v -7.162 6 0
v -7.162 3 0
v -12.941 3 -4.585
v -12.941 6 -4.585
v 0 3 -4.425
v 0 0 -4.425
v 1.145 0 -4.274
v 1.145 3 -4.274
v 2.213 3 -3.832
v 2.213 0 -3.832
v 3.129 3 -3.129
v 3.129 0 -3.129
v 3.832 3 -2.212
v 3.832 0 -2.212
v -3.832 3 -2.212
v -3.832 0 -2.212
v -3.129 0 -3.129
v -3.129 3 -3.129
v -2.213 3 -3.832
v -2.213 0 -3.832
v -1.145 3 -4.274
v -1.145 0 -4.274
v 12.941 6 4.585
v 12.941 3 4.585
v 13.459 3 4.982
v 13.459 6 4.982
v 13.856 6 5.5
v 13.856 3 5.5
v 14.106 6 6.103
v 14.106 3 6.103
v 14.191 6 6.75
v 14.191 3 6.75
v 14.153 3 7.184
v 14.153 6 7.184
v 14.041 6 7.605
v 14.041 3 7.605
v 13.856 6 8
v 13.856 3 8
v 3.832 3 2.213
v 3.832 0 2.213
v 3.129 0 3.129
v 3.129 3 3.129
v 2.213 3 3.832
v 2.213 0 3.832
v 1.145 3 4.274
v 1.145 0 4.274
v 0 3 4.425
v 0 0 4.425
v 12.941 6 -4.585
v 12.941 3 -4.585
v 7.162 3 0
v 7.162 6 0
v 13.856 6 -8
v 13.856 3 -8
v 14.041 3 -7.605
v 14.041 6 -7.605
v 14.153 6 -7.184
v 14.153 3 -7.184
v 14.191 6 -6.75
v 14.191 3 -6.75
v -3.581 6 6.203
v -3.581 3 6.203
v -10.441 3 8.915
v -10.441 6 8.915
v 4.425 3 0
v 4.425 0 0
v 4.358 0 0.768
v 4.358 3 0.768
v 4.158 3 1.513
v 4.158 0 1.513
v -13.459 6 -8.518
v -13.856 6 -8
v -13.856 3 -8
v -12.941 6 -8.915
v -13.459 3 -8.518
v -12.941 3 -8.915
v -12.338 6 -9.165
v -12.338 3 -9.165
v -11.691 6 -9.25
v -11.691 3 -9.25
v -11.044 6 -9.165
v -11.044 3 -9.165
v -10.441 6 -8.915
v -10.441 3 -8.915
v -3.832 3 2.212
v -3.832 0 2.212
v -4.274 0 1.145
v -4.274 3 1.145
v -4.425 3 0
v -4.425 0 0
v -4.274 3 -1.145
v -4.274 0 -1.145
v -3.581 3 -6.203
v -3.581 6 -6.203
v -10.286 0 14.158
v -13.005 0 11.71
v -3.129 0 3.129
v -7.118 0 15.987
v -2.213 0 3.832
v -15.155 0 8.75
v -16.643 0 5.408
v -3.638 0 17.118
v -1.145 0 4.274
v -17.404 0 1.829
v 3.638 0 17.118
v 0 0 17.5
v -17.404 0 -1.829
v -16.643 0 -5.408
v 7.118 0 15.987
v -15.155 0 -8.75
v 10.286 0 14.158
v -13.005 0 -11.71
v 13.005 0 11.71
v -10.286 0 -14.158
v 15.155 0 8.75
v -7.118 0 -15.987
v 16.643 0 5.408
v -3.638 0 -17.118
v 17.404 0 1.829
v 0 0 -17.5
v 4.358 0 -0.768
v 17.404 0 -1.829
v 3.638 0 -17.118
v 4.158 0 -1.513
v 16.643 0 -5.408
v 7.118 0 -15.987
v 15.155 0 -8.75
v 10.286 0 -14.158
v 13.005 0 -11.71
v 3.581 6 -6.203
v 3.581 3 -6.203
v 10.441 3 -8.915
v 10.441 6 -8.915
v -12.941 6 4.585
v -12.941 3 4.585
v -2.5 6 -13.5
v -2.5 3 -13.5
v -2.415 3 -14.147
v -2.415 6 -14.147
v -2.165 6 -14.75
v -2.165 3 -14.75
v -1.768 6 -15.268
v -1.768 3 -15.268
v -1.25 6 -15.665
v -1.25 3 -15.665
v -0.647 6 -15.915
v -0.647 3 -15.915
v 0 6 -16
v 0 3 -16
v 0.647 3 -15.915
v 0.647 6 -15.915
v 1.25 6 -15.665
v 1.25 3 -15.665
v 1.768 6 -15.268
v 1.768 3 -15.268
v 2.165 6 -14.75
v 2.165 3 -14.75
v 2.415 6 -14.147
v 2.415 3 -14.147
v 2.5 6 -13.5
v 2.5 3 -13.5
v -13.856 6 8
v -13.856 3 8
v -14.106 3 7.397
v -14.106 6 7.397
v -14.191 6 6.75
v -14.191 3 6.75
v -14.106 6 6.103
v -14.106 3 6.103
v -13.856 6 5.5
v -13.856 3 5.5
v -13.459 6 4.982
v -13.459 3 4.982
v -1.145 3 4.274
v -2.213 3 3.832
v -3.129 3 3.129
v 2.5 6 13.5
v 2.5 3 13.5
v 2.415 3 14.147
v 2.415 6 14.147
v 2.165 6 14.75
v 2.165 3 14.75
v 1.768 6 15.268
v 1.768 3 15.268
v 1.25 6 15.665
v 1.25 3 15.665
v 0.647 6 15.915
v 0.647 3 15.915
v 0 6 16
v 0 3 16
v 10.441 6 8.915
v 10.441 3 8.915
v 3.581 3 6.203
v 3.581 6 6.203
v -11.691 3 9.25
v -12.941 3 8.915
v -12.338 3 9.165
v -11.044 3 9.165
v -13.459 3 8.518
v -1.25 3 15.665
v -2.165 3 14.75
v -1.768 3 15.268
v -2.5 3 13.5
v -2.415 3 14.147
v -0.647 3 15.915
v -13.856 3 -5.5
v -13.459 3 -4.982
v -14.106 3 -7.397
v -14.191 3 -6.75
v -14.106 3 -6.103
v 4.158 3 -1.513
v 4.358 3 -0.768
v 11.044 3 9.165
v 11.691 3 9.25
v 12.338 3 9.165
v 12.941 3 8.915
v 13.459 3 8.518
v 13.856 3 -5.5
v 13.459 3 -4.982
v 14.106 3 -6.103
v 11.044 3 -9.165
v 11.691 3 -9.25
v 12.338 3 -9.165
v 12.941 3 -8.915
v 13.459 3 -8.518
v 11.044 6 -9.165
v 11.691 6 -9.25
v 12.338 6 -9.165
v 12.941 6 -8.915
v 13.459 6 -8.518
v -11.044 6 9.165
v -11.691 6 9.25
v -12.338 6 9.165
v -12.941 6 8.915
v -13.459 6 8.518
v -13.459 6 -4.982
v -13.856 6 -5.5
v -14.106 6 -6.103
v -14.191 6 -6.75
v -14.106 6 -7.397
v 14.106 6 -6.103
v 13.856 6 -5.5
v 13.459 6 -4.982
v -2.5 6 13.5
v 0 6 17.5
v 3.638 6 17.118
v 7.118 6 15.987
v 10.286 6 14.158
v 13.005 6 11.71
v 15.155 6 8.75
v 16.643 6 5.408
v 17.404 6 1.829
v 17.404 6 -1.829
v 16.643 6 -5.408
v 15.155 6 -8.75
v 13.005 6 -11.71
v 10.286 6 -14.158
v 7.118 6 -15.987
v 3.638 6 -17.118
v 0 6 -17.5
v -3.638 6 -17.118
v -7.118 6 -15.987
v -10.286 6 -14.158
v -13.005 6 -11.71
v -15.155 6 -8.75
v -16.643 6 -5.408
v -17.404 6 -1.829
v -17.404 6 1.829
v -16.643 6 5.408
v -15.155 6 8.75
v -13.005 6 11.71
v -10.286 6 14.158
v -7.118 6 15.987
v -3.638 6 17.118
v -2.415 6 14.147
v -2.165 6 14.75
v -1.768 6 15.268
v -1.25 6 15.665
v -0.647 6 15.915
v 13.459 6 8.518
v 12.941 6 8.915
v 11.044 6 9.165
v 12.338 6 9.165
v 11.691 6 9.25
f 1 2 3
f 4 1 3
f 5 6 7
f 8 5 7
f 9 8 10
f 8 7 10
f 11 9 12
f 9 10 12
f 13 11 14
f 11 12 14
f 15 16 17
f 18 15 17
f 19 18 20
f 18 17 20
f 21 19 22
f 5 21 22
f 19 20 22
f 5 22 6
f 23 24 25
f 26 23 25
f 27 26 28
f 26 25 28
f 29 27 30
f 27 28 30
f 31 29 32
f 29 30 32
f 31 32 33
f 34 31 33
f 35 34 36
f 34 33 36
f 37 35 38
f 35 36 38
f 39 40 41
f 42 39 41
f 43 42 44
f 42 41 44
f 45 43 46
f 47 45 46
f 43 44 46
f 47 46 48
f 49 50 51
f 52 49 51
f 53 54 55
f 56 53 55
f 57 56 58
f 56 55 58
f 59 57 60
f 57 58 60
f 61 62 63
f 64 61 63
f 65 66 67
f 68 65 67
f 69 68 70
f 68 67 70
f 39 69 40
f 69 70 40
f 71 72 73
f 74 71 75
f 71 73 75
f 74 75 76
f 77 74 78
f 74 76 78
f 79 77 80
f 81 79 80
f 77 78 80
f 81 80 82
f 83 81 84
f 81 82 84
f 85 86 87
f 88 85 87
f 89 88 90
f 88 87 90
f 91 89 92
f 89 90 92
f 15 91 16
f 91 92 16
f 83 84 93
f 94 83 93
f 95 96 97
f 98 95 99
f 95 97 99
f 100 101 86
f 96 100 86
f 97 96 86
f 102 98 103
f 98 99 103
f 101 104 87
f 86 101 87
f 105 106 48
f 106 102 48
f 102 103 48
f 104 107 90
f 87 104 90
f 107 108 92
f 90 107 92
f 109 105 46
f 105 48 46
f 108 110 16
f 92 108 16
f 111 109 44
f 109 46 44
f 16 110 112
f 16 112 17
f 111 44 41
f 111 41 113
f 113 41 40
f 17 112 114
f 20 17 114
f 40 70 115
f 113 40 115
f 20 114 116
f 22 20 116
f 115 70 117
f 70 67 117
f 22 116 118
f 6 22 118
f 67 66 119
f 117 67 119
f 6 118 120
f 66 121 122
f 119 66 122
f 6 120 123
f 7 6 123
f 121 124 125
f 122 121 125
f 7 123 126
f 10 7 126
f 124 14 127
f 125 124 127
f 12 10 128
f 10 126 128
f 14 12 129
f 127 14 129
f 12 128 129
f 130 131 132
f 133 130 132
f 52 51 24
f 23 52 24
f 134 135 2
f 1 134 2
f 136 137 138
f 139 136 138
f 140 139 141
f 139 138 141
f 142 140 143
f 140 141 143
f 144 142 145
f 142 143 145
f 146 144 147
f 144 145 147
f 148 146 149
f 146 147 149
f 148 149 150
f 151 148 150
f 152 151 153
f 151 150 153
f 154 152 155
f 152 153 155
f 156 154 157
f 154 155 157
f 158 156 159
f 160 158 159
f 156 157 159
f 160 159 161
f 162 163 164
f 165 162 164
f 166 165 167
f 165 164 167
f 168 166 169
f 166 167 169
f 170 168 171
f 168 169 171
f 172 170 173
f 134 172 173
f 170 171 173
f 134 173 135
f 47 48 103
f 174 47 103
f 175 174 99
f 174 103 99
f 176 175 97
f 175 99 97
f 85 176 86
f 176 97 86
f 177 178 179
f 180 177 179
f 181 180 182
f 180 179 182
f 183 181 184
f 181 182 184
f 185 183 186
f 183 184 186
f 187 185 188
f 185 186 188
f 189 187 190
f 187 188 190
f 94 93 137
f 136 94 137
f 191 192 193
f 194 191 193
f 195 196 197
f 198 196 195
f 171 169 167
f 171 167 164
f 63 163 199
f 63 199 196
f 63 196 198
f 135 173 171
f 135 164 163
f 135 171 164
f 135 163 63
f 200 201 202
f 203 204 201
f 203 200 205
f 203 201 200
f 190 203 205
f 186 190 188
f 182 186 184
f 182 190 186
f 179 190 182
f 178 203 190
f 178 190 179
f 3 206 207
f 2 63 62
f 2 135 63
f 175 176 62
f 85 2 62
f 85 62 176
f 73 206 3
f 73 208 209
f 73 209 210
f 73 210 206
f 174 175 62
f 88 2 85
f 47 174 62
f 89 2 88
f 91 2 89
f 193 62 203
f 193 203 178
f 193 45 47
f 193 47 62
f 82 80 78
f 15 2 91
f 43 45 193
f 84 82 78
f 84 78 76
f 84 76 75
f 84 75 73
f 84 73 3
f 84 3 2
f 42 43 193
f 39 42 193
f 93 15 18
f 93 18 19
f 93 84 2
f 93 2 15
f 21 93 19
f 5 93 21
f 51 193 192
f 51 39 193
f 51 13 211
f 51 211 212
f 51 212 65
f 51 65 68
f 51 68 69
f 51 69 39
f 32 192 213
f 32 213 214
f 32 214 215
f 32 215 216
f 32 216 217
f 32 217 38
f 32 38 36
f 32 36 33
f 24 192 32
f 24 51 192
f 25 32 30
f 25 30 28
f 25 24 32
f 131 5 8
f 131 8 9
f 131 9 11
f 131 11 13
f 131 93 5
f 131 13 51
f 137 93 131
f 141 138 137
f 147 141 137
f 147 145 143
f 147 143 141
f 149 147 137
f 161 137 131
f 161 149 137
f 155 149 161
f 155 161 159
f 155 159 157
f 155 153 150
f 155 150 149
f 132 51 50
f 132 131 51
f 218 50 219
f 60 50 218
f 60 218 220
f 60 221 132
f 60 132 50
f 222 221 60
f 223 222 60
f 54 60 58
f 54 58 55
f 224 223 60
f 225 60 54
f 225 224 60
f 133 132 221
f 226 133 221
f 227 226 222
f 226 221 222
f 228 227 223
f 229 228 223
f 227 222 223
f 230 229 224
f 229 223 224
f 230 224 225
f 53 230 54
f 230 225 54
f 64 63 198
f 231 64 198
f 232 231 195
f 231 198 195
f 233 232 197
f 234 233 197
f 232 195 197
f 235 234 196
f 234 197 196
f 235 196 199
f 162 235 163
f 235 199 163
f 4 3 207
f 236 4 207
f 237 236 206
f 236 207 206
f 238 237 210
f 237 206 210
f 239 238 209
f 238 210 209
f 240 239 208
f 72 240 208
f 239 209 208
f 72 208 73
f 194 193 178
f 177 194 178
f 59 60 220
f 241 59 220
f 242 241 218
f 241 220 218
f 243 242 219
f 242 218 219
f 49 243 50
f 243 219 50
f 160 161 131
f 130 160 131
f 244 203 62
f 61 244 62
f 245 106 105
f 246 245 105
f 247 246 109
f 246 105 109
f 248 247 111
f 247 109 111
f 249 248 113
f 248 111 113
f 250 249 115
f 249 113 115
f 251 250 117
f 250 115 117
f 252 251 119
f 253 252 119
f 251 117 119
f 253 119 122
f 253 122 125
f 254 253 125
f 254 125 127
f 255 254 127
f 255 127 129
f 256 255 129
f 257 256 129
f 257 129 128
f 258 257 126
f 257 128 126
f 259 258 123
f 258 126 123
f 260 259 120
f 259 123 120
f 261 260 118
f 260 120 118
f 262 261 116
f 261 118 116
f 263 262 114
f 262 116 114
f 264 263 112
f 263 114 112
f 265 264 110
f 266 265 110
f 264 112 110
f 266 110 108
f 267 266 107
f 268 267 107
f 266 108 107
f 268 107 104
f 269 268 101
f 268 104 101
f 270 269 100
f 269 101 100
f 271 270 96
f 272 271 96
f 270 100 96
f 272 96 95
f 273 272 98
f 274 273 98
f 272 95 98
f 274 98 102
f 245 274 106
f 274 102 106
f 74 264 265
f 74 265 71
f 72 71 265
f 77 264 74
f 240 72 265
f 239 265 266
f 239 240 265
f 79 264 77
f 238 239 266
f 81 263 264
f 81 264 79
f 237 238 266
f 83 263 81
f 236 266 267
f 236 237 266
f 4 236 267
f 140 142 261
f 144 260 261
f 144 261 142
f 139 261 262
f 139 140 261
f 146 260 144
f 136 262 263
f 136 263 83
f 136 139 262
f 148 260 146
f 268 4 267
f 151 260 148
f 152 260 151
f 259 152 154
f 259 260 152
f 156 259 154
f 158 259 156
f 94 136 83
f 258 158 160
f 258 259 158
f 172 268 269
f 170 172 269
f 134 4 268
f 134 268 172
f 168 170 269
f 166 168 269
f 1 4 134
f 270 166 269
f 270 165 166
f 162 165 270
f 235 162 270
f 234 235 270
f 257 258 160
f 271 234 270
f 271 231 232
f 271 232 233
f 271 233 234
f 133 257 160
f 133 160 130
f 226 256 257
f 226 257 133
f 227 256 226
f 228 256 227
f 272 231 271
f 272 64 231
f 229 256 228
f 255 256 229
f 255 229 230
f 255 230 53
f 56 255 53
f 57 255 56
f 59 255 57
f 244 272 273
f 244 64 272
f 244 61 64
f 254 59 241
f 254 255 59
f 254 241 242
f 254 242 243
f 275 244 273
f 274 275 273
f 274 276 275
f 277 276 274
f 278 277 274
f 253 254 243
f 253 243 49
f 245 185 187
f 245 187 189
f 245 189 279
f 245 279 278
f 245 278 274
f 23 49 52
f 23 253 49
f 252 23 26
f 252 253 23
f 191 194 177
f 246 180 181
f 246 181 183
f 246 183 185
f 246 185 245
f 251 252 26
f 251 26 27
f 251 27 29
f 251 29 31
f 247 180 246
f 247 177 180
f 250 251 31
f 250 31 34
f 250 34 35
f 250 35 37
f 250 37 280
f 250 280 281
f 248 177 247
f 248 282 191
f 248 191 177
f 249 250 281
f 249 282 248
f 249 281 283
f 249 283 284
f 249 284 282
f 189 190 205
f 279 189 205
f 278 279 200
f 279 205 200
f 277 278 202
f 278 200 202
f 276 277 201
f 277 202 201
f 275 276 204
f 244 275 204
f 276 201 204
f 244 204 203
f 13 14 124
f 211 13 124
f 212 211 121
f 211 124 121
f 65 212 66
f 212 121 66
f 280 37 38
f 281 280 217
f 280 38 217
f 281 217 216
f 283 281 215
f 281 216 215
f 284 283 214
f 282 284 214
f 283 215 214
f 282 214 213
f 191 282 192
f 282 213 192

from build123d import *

# Parameters (mm, degrees)
SKETCH1_R           = 17.5
BOSS_EXTRUDE3_DEPTH = 6
SKETCH1_11_R        = 4.425
BOSS_EXTRUDE5_DEPTH = 3


with BuildPart() as part:
    # Sketch1 → Boss-Extrude3 (new body)
    with BuildSketch(Plane(origin=(0, 0, 0), x_dir=(1, 0, 0), z_dir=(0, 1, 0))):
        Circle(SKETCH1_R)
        with BuildLine():
            ThreePointArc((-2.5, 13.5), (-1.767766953, 15.267766953), (0, 16))
            ThreePointArc((0, 16), (1.767766953, 15.267766953), (2.5, 13.5))
            Line((2.5, 13.5), (3.581091494, 6.202632414))
            Line((3.581091494, 6.202632414), (10.441342951, 8.915063509))
            ThreePointArc((10.441342951, 8.915063509), (12.338390564, 9.164814566), (13.856406461, 8))
            ThreePointArc((13.856406461, 8), (14.106157517, 7.397047613), (14.191342951, 6.75))
            ThreePointArc((14.191342951, 6.75), (13.856406461, 5.5), (12.941342951, 4.584936491))
            Line((12.941342951, 4.584936491), (7.162182988, 0))
            Line((7.162182988, 0), (12.941342951, -4.584936491))
            ThreePointArc((12.941342951, -4.584936491), (13.856406461, -5.5), (14.191342951, -6.75))
            ThreePointArc((14.191342951, -6.75), (14.106157517, -7.397047613), (13.856406461, -8))
            ThreePointArc((13.856406461, -8), (12.338390564, -9.164814566), (10.441342951, -8.915063509))
            Line((10.441342951, -8.915063509), (3.581091494, -6.202632414))
            Line((3.581091494, -6.202632414), (2.5, -13.5))
            ThreePointArc((2.5, -13.5), (1.767766953, -15.267766953), (0, -16))
            ThreePointArc((0, -16), (-1.767766953, -15.267766953), (-2.5, -13.5))
            Line((-2.5, -13.5), (-3.581091494, -6.202632414))
            Line((-3.581091494, -6.202632414), (-10.441342951, -8.915063509))
            ThreePointArc((-10.441342951, -8.915063509), (-12.338390564, -9.164814566), (-13.856406461, -8))
            ThreePointArc((-13.856406461, -8), (-14.106157517, -6.102952387), (-12.941342951, -4.584936491))
            Line((-12.941342951, -4.584936491), (-7.162182988, 0))
            Line((-7.162182988, 0), (-12.941342951, 4.584936491))
            ThreePointArc((-12.941342951, 4.584936491), (-14.106157517, 6.102952387), (-13.856406461, 8))
            ThreePointArc((-13.856406461, 8), (-12.338390564, 9.164814566), (-10.441342951, 8.915063509))
            Line((-10.441342951, 8.915063509), (-3.581091494, 6.202632414))
            Line((-3.581091494, 6.202632414), (-2.5, 13.5))
        make_face(mode=Mode.SUBTRACT)
    extrude(amount=BOSS_EXTRUDE3_DEPTH)

    # Sketch1<11> → Boss-Extrude5 (add)
    with BuildSketch(Plane(origin=(0, 0, 0), x_dir=(1, 0, 0), z_dir=(0, 1, 0))):
        with BuildLine():
            Line((-2.5, 13.5), (-3.581091494, 6.202632414))
            Line((-3.581091494, 6.202632414), (-10.441342951, 8.915063509))
            ThreePointArc((-10.441342951, 8.915063509), (-13.856406461, 8), (-12.941342951, 4.584936491))
            Line((-12.941342951, 4.584936491), (-7.162182988, 0))
            Line((-7.162182988, 0), (-12.941342951, -4.584936491))
            ThreePointArc((-12.941342951, -4.584936491), (-13.856406461, -8), (-10.441342951, -8.915063509))
            Line((-10.441342951, -8.915063509), (-3.581091494, -6.202632414))
            Line((-3.581091494, -6.202632414), (-2.5, -13.5))
            ThreePointArc((-2.5, -13.5), (0, -16), (2.5, -13.5))
            Line((2.5, -13.5), (3.581091494, -6.202632414))
            Line((3.581091494, -6.202632414), (10.441342951, -8.915063509))
            ThreePointArc((10.441342951, -8.915063509), (13.856406461, -8), (12.941342951, -4.584936491))
            Line((12.941342951, -4.584936491), (7.162182988, 0))
            Line((7.162182988, 0), (12.941342951, 4.584936491))
            ThreePointArc((12.941342951, 4.584936491), (13.856406461, 8), (10.441342951, 8.915063509))
            Line((10.441342951, 8.915063509), (3.581091494, 6.202632414))
            Line((3.581091494, 6.202632414), (2.5, 13.5))
            ThreePointArc((2.5, 13.5), (0, 16), (-2.5, 13.5))
        make_face()
        Circle(SKETCH1_11_R, mode=Mode.SUBTRACT)
    extrude(amount=BOSS_EXTRUDE5_DEPTH)


solid = part.part
